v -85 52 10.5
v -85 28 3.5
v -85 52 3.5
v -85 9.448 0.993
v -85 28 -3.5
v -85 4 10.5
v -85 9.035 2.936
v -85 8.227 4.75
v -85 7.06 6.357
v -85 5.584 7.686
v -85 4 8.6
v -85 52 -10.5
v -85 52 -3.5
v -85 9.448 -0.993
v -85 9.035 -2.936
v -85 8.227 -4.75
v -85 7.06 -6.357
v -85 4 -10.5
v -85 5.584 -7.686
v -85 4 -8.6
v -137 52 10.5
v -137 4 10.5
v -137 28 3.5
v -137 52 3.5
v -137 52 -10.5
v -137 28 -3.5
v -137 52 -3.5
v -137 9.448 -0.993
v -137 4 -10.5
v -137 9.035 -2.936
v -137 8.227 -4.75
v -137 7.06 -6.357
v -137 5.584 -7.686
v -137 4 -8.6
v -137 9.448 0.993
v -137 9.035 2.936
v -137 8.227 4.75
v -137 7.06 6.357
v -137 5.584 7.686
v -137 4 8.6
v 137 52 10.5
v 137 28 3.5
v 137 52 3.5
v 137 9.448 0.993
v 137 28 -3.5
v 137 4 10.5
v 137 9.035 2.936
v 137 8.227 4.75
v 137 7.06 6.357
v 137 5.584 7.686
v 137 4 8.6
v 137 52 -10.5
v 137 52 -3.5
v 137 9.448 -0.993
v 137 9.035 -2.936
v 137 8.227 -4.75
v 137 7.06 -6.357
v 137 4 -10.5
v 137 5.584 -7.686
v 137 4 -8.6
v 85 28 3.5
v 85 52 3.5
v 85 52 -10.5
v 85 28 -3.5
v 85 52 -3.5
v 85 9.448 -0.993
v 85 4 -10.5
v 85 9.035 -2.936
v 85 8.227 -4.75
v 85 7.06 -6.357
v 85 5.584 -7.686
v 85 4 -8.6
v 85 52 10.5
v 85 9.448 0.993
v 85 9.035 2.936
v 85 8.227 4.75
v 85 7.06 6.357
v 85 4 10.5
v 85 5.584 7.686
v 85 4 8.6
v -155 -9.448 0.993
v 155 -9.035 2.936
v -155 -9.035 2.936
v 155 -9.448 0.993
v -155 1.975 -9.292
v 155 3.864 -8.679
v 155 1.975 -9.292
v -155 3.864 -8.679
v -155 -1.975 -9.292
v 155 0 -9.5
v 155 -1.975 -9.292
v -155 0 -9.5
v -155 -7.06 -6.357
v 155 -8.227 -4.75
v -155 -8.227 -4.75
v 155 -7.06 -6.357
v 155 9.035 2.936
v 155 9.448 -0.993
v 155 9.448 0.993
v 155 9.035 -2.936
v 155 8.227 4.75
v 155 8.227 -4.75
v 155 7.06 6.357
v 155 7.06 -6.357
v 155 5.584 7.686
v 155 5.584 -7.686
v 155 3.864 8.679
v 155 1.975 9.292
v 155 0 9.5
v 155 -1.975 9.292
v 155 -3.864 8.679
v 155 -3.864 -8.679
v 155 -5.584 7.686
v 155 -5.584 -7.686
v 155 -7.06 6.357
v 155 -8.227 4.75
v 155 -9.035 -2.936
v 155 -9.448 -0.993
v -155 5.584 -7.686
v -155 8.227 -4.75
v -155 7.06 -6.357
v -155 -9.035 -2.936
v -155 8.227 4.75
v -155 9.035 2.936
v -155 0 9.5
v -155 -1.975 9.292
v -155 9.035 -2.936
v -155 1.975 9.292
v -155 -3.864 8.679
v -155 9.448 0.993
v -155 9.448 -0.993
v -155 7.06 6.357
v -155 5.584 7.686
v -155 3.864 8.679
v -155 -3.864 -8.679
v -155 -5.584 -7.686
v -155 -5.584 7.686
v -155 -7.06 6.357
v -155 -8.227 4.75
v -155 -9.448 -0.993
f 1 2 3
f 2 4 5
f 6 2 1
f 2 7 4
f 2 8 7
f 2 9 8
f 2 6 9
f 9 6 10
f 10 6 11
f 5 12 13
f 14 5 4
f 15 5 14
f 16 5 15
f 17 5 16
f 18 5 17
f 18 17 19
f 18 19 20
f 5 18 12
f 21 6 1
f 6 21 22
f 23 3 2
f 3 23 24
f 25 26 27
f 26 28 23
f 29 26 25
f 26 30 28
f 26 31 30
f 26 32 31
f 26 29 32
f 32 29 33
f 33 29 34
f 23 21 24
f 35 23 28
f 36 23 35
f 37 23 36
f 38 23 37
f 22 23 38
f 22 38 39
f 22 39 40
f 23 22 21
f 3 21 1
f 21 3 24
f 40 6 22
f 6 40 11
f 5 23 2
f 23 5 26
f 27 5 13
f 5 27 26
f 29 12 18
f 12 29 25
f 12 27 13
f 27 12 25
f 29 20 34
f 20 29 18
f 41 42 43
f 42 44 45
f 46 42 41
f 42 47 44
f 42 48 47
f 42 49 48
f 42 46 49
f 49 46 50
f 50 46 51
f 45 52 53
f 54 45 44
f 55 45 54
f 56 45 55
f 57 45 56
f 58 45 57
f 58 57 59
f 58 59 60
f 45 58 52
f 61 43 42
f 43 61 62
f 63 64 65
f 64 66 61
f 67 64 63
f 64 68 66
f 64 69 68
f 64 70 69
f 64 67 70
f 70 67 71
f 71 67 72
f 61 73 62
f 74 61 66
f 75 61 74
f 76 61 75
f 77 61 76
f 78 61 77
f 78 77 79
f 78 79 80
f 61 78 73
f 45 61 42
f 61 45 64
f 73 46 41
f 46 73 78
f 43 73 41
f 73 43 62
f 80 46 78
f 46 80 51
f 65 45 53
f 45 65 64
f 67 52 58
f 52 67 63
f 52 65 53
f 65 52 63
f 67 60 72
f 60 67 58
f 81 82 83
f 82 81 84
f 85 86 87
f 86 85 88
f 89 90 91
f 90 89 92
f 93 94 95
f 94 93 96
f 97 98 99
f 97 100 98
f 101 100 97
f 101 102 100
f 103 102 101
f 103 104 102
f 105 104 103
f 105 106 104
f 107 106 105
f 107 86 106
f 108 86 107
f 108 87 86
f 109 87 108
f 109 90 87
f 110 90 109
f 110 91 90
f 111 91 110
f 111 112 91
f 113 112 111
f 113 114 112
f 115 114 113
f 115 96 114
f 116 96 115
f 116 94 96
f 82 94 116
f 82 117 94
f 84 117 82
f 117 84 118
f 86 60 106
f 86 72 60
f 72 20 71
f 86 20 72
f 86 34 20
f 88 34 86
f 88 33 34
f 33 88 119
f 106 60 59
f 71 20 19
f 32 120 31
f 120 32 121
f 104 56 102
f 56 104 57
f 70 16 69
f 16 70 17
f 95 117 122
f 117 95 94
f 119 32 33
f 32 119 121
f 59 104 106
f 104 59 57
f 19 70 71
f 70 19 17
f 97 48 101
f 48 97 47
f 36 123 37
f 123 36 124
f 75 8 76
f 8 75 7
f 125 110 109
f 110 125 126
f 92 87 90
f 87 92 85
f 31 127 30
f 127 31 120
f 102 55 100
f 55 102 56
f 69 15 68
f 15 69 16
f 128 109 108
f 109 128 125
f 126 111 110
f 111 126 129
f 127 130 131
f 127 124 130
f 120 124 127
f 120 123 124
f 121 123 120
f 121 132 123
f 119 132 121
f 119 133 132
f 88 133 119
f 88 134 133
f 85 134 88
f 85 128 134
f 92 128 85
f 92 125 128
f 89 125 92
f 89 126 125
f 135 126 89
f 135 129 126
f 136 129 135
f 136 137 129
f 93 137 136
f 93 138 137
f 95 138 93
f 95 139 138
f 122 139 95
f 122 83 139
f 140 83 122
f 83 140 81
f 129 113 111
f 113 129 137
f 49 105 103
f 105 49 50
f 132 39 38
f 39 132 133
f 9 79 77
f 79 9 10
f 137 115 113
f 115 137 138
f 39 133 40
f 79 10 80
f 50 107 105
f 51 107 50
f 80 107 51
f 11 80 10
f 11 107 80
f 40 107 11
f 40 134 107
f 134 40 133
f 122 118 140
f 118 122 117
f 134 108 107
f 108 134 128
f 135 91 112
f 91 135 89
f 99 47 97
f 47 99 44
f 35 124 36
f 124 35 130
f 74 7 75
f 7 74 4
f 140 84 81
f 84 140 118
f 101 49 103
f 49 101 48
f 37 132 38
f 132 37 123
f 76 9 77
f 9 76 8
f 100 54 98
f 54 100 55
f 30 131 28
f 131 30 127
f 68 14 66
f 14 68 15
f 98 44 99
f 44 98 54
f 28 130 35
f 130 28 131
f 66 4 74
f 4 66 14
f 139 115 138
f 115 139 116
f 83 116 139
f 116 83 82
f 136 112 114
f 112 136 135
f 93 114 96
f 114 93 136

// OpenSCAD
// file: ../robot_settings.scad
main_box_x = 100; // 96
main_box_y = 102;
main_box_z = 74; // 74.5

lfp_main_box_x = 65;
lfp_main_box_y = 152;
lfp_main_box_z = 94;

wall_thickness = 5;

rail_gap = 2;
rail_inset = 7;

rail_thickness = 7;
rail_length = 250;
rail_width = 260;

lfp_battery_width = 65.5;
lfp_battery_depth = 150.5;
lfp_battery_height = 93;
lfp_battery_midterrace_width = 64.8;
lfp_battery_midterrace_depth = 150.2;
lfp_battery_midterrace_height = 7.8;
lfp_battery_topterrace_width = 62.8;
lfp_battery_topterrace_depth = 149.4;
lfp_battery_topterrace_height = 6.6;

// red right
// black left
lfp_battery_terminal_width = 9.2;
lfp_battery_terminal_depth = 9.5;
lfp_battery_terminal_depth_setback = 4.4;
lfp_battery_terminal_width_setback = 5.9;

raspberry_pi_screw_seperation_y = 57;
raspberry_pi_screw_seperation_z = 48;
raspberry_pi_peg_h = 5;

battery_box_peg_h = 6;
battery_box_peg_d = 9.5;
battery_box_peg_cutout = 5;

gears_module = 1;
pinion_gear_teeth = 32;
pinion_gear_width = 5;
pinion_gear_bore = 8;

gears_setback_distance = 25;
gear_post_height = 2 * pinion_gear_width + rail_thickness + 8 ;

steering_motor_mount_x = 45;
steering_motor_mount_y = 36;
steering_motor_mount_z = 18;
steering_motor_mount_setback_distance = gears_setback_distance + 16;

cradle_wall_thickness = 5;
post_thickness_x_y = 10;
post_wallside_position_y = 12.5;
post_separation_y = 47.5;
post_x_position = 70; // width of cradle. this is proportional to rail_width.

imu_width = 26; // x is along the width axis
imu_depth = 16; // y is along the depth axes. +y points at pins.
imu_screw_d = 3;
imu_screw_corner_border = 1.27;
imu_underside_pin_h = 1; // z is along the h axis
imu_thickness = 1.6;
imu_left_edge_pins = 1.6;

dc_motor_drivertype = "Teyleten"; // Teyleten
isAdafruit = (dc_motor_drivertype == "Adafruit");

drv8871_x = isAdafruit ? 20.3 : 21.6;
drv8871_y = isAdafruit ?  24 : 25;

drv8871_z = 2;
drv8871_screw_d = 2.5;
drv8871_solder_points_z = 2;

drv8871mount_edge_x = 1.5;
drv8871mount_edge_wall = 3;
drv8871mount_z = 5;
drv8871mount_x = drv8871_x +  drv8871mount_edge_wall - 2* drv8871mount_edge_x;
drv8871mount_y = 19;

drv8871_screw_distance = 15.64;
drv8871_solder_points_d = 1.66;
drv8871_solder_offset_y = 4.4;
drv8871_solder_inner_points_distance = 5;
drv8871_solder_outer_points_distance = 12;

dc_motor_75_1_encoder_z = 14.75;
dc_motor_75_1_encoder_d = 24.5;
dc_motor_75_1_housing_z = 30;
dc_motor_75_1_housing_d = 24.1;
dc_motor_75_1_gearbox_z = 23;
dc_motor_75_1_gearbox_d = 24.8;
dc_motor_75_1_z = dc_motor_75_1_encoder_z + dc_motor_75_1_housing_z + dc_motor_75_1_gearbox_z;

dc_motor_housing_minus_encoder_z = 48;
dc_motor_encoder_z = 9.33;
dc_motor_encoder_wheel_d = 13.4;
dc_motor_encoder_wheel_thickness = 5;
dc_motor_encoder_wheel_gap = 3;
dc_motor_encoder_circuit_thickness = 2;
dc_motor_z = dc_motor_housing_minus_encoder_z + dc_motor_encoder_z + dc_motor_encoder_wheel_thickness + dc_motor_encoder_wheel_gap + dc_motor_encoder_circuit_thickness;
dc_motor_cutout_d = 24.8;
dc_motor_cutout_z = 19.5;


M3_shaft_d = 2.82;

dc_motor_screw_head_z = 2;
dc_motor_screw_head_d = 5.6;
dc_motor_screw_d = 3.2;
dc_motor_screw_offset = 8.5;

dc_motor_axle_ring_z = 3;
dc_motor_axle_ring_d = 7.2;
dc_motor_axle_cutout_d = 4.2;
dc_motor_axle_cutout_z = 10;
dc_motor_axle_notch_cutout = 0.4;
dc_motor_axle_notch_cutout_z = 6;

pdmount_x = 20;
pdmount_y = 30;
pdmount_z = 2;
pdmount_edge_x = 1.5;
pdmount_edge_wall = 3;

steering_shaft_z = 45;
steering_shaft_d = 7;
steering_shaft_motor_fitting_d = 9;
coupler_length = 24.6;
coupler_diameter = 14;
coupler_screw_d = 4;
coupler_screw_z_offset = 8.3;
coupler_gear_side_insert = 12.6;
steering_shaft_with_coupler_z = steering_shaft_z - coupler_gear_side_insert;

lidar_mount_y = 110;
lidar_mount_x = 65 + 20;
lidar_narrow_screws = 40;
lidar_wide_screws = 56;
lidar_front_to_back_screws = 70;
lidar_screw_d = 3;
lidar_circuitboard_x = 20;
lidar_circuitboard_y = 35;
lidar_circuitboard_z = 1.2;
lidar_cord_length = 29;

ball_bearing_height = 7;
ball_bearing_outer_diameter = 22;
ball_bearing_inner_diameter = 8;

M4_diameter = 5.1;
M3_diameter = 2.9;
M3_length = 35;
M3_cap_length= 3;
M3_cap_diameter = 5.44;

suspension_spring_outer_diameter = 8;
suspension_spring_inner_diameter = 5.3;

armature_holder_height = 20;
armature_holder_thickness = 8;
pull_bar_peg_r = 3.2;
apparatus_locking_peg_d = 4;

rack_module = 1;
rack_length = main_box_x;
rack_height = 5;
rack_width = 10;
rack_teeth = 30;
rack_bore = 3;

pull_bar_length = rail_width / 2 - rack_length + 1;

// tire hardware
axle_length = 42.0; 
axle_reciever_inner_diameter = ball_bearing_inner_diameter;
axle_reciever_outer_diameter = 12;
axle_reciever_length = 18.8;
axle_notch_length = 15;
axle_notch_cutout = 2.4;

// power distribution bar
power_bar_cutout_x = 96;
power_bar_y = 19.1;
power_bar_z = 1.5;
power_bar_screw_distance = 91.4;
power_bar_screw_d = 2.8;
power_bar_standoff_z = 5;
power_bar_standoff_d = 6.83;

pico_expander_width = 63;
pico_expander_height = 57;
pico_screw_hole_offset = 3;
pico_screw_hole_d = 2.5;

usbhub_thickness = 11.7;
usbhub_depth = 37.5;
usbhub_width = 86.7;
usbhub_end_port_width = 14.8;
usbhub_end_port_height = 12;
usbhub_front_face_safe_zone_left = 15;
usbhub_front_face_safe_zone_right = 14.8;

switch_w = 16;
switch_cutout_d = 12.2;
switch_bump_h = 2;
switch_bump_l = 18.2;

i2c_mount_thickness = 3;
i2c_w = 28;
i2c_l = 28;
i2c_circuitboard_thickness = 1.23;
i2c_bottom_notch_w = 14.35;
i2c_bottom_notch_depth = 1;
i2c_screw_hole_d = 1.9;
i2c_screw_hole_offset = 1.4;
i2c_pin_l = 11;
i2c_pin_d = 0.8;
i2c_pin_offset = 1.5;
i2c_pin_separation = 2.5;
i2c_all_pins_l = 8.3;
i2c_screen_thickness = 1.88;
i2c_screen_w = 14.6;
i2c_screen_d = 27;
i2c_screen_offset = 4.1;
// main file
   include <../robot_settings.scad>

module clam_pipe(show_blades = true, length_offset = 50, diameter = 19 ) {
      // clam pipe
       translate([0, 0, 0]) {
          rotate([0, 90, 0])
          cylinder(h = rail_width + length_offset, d = diameter, center = true);
       }

       blade_length = 48;
       filling_length = 26;
      
      // clams
      if (show_blades)
       translate([0, 13, 0])
       {
         // right upper clam blade -71.43 = 200 / 2.8 -> -76.43 /  200 = 1/2.62
         color("red")
        translate([-rail_width / 2 + 19,  15, rail_thickness])
        cube([rail_width / 5,  blade_length, rail_thickness], center = true);
         
         // right filling
         color("red")
         translate([-rail_width / 2 + 19, 2, -1])
         cube([rail_width / 5, filling_length, rail_thickness + 2], center = true);
         
         // right lower clam blade
         color("red")
        translate([-rail_width / 2 + 19,  15, -rail_thickness])
        cube([rail_width / 5,  blade_length, rail_thickness], center = true);
         
         // left filling
         color("green")
         translate([rail_width / 2 - 19, 2, -1])
         cube([rail_width / 5, filling_length, rail_thickness + 2], center = true);
         
        // left upper clam blade
        color("green")        
        translate([rail_width / 2 - 19,  15, rail_thickness])
        cube([rail_width / 5,  blade_length, rail_thickness], center = true);
        
         // left lower clam blade
        translate([rail_width / 2 - 19,  15, -rail_thickness])
        color("green")
        cube([rail_width / 5,  blade_length, rail_thickness], center = true);
      }
    }
    clam_pipe();
